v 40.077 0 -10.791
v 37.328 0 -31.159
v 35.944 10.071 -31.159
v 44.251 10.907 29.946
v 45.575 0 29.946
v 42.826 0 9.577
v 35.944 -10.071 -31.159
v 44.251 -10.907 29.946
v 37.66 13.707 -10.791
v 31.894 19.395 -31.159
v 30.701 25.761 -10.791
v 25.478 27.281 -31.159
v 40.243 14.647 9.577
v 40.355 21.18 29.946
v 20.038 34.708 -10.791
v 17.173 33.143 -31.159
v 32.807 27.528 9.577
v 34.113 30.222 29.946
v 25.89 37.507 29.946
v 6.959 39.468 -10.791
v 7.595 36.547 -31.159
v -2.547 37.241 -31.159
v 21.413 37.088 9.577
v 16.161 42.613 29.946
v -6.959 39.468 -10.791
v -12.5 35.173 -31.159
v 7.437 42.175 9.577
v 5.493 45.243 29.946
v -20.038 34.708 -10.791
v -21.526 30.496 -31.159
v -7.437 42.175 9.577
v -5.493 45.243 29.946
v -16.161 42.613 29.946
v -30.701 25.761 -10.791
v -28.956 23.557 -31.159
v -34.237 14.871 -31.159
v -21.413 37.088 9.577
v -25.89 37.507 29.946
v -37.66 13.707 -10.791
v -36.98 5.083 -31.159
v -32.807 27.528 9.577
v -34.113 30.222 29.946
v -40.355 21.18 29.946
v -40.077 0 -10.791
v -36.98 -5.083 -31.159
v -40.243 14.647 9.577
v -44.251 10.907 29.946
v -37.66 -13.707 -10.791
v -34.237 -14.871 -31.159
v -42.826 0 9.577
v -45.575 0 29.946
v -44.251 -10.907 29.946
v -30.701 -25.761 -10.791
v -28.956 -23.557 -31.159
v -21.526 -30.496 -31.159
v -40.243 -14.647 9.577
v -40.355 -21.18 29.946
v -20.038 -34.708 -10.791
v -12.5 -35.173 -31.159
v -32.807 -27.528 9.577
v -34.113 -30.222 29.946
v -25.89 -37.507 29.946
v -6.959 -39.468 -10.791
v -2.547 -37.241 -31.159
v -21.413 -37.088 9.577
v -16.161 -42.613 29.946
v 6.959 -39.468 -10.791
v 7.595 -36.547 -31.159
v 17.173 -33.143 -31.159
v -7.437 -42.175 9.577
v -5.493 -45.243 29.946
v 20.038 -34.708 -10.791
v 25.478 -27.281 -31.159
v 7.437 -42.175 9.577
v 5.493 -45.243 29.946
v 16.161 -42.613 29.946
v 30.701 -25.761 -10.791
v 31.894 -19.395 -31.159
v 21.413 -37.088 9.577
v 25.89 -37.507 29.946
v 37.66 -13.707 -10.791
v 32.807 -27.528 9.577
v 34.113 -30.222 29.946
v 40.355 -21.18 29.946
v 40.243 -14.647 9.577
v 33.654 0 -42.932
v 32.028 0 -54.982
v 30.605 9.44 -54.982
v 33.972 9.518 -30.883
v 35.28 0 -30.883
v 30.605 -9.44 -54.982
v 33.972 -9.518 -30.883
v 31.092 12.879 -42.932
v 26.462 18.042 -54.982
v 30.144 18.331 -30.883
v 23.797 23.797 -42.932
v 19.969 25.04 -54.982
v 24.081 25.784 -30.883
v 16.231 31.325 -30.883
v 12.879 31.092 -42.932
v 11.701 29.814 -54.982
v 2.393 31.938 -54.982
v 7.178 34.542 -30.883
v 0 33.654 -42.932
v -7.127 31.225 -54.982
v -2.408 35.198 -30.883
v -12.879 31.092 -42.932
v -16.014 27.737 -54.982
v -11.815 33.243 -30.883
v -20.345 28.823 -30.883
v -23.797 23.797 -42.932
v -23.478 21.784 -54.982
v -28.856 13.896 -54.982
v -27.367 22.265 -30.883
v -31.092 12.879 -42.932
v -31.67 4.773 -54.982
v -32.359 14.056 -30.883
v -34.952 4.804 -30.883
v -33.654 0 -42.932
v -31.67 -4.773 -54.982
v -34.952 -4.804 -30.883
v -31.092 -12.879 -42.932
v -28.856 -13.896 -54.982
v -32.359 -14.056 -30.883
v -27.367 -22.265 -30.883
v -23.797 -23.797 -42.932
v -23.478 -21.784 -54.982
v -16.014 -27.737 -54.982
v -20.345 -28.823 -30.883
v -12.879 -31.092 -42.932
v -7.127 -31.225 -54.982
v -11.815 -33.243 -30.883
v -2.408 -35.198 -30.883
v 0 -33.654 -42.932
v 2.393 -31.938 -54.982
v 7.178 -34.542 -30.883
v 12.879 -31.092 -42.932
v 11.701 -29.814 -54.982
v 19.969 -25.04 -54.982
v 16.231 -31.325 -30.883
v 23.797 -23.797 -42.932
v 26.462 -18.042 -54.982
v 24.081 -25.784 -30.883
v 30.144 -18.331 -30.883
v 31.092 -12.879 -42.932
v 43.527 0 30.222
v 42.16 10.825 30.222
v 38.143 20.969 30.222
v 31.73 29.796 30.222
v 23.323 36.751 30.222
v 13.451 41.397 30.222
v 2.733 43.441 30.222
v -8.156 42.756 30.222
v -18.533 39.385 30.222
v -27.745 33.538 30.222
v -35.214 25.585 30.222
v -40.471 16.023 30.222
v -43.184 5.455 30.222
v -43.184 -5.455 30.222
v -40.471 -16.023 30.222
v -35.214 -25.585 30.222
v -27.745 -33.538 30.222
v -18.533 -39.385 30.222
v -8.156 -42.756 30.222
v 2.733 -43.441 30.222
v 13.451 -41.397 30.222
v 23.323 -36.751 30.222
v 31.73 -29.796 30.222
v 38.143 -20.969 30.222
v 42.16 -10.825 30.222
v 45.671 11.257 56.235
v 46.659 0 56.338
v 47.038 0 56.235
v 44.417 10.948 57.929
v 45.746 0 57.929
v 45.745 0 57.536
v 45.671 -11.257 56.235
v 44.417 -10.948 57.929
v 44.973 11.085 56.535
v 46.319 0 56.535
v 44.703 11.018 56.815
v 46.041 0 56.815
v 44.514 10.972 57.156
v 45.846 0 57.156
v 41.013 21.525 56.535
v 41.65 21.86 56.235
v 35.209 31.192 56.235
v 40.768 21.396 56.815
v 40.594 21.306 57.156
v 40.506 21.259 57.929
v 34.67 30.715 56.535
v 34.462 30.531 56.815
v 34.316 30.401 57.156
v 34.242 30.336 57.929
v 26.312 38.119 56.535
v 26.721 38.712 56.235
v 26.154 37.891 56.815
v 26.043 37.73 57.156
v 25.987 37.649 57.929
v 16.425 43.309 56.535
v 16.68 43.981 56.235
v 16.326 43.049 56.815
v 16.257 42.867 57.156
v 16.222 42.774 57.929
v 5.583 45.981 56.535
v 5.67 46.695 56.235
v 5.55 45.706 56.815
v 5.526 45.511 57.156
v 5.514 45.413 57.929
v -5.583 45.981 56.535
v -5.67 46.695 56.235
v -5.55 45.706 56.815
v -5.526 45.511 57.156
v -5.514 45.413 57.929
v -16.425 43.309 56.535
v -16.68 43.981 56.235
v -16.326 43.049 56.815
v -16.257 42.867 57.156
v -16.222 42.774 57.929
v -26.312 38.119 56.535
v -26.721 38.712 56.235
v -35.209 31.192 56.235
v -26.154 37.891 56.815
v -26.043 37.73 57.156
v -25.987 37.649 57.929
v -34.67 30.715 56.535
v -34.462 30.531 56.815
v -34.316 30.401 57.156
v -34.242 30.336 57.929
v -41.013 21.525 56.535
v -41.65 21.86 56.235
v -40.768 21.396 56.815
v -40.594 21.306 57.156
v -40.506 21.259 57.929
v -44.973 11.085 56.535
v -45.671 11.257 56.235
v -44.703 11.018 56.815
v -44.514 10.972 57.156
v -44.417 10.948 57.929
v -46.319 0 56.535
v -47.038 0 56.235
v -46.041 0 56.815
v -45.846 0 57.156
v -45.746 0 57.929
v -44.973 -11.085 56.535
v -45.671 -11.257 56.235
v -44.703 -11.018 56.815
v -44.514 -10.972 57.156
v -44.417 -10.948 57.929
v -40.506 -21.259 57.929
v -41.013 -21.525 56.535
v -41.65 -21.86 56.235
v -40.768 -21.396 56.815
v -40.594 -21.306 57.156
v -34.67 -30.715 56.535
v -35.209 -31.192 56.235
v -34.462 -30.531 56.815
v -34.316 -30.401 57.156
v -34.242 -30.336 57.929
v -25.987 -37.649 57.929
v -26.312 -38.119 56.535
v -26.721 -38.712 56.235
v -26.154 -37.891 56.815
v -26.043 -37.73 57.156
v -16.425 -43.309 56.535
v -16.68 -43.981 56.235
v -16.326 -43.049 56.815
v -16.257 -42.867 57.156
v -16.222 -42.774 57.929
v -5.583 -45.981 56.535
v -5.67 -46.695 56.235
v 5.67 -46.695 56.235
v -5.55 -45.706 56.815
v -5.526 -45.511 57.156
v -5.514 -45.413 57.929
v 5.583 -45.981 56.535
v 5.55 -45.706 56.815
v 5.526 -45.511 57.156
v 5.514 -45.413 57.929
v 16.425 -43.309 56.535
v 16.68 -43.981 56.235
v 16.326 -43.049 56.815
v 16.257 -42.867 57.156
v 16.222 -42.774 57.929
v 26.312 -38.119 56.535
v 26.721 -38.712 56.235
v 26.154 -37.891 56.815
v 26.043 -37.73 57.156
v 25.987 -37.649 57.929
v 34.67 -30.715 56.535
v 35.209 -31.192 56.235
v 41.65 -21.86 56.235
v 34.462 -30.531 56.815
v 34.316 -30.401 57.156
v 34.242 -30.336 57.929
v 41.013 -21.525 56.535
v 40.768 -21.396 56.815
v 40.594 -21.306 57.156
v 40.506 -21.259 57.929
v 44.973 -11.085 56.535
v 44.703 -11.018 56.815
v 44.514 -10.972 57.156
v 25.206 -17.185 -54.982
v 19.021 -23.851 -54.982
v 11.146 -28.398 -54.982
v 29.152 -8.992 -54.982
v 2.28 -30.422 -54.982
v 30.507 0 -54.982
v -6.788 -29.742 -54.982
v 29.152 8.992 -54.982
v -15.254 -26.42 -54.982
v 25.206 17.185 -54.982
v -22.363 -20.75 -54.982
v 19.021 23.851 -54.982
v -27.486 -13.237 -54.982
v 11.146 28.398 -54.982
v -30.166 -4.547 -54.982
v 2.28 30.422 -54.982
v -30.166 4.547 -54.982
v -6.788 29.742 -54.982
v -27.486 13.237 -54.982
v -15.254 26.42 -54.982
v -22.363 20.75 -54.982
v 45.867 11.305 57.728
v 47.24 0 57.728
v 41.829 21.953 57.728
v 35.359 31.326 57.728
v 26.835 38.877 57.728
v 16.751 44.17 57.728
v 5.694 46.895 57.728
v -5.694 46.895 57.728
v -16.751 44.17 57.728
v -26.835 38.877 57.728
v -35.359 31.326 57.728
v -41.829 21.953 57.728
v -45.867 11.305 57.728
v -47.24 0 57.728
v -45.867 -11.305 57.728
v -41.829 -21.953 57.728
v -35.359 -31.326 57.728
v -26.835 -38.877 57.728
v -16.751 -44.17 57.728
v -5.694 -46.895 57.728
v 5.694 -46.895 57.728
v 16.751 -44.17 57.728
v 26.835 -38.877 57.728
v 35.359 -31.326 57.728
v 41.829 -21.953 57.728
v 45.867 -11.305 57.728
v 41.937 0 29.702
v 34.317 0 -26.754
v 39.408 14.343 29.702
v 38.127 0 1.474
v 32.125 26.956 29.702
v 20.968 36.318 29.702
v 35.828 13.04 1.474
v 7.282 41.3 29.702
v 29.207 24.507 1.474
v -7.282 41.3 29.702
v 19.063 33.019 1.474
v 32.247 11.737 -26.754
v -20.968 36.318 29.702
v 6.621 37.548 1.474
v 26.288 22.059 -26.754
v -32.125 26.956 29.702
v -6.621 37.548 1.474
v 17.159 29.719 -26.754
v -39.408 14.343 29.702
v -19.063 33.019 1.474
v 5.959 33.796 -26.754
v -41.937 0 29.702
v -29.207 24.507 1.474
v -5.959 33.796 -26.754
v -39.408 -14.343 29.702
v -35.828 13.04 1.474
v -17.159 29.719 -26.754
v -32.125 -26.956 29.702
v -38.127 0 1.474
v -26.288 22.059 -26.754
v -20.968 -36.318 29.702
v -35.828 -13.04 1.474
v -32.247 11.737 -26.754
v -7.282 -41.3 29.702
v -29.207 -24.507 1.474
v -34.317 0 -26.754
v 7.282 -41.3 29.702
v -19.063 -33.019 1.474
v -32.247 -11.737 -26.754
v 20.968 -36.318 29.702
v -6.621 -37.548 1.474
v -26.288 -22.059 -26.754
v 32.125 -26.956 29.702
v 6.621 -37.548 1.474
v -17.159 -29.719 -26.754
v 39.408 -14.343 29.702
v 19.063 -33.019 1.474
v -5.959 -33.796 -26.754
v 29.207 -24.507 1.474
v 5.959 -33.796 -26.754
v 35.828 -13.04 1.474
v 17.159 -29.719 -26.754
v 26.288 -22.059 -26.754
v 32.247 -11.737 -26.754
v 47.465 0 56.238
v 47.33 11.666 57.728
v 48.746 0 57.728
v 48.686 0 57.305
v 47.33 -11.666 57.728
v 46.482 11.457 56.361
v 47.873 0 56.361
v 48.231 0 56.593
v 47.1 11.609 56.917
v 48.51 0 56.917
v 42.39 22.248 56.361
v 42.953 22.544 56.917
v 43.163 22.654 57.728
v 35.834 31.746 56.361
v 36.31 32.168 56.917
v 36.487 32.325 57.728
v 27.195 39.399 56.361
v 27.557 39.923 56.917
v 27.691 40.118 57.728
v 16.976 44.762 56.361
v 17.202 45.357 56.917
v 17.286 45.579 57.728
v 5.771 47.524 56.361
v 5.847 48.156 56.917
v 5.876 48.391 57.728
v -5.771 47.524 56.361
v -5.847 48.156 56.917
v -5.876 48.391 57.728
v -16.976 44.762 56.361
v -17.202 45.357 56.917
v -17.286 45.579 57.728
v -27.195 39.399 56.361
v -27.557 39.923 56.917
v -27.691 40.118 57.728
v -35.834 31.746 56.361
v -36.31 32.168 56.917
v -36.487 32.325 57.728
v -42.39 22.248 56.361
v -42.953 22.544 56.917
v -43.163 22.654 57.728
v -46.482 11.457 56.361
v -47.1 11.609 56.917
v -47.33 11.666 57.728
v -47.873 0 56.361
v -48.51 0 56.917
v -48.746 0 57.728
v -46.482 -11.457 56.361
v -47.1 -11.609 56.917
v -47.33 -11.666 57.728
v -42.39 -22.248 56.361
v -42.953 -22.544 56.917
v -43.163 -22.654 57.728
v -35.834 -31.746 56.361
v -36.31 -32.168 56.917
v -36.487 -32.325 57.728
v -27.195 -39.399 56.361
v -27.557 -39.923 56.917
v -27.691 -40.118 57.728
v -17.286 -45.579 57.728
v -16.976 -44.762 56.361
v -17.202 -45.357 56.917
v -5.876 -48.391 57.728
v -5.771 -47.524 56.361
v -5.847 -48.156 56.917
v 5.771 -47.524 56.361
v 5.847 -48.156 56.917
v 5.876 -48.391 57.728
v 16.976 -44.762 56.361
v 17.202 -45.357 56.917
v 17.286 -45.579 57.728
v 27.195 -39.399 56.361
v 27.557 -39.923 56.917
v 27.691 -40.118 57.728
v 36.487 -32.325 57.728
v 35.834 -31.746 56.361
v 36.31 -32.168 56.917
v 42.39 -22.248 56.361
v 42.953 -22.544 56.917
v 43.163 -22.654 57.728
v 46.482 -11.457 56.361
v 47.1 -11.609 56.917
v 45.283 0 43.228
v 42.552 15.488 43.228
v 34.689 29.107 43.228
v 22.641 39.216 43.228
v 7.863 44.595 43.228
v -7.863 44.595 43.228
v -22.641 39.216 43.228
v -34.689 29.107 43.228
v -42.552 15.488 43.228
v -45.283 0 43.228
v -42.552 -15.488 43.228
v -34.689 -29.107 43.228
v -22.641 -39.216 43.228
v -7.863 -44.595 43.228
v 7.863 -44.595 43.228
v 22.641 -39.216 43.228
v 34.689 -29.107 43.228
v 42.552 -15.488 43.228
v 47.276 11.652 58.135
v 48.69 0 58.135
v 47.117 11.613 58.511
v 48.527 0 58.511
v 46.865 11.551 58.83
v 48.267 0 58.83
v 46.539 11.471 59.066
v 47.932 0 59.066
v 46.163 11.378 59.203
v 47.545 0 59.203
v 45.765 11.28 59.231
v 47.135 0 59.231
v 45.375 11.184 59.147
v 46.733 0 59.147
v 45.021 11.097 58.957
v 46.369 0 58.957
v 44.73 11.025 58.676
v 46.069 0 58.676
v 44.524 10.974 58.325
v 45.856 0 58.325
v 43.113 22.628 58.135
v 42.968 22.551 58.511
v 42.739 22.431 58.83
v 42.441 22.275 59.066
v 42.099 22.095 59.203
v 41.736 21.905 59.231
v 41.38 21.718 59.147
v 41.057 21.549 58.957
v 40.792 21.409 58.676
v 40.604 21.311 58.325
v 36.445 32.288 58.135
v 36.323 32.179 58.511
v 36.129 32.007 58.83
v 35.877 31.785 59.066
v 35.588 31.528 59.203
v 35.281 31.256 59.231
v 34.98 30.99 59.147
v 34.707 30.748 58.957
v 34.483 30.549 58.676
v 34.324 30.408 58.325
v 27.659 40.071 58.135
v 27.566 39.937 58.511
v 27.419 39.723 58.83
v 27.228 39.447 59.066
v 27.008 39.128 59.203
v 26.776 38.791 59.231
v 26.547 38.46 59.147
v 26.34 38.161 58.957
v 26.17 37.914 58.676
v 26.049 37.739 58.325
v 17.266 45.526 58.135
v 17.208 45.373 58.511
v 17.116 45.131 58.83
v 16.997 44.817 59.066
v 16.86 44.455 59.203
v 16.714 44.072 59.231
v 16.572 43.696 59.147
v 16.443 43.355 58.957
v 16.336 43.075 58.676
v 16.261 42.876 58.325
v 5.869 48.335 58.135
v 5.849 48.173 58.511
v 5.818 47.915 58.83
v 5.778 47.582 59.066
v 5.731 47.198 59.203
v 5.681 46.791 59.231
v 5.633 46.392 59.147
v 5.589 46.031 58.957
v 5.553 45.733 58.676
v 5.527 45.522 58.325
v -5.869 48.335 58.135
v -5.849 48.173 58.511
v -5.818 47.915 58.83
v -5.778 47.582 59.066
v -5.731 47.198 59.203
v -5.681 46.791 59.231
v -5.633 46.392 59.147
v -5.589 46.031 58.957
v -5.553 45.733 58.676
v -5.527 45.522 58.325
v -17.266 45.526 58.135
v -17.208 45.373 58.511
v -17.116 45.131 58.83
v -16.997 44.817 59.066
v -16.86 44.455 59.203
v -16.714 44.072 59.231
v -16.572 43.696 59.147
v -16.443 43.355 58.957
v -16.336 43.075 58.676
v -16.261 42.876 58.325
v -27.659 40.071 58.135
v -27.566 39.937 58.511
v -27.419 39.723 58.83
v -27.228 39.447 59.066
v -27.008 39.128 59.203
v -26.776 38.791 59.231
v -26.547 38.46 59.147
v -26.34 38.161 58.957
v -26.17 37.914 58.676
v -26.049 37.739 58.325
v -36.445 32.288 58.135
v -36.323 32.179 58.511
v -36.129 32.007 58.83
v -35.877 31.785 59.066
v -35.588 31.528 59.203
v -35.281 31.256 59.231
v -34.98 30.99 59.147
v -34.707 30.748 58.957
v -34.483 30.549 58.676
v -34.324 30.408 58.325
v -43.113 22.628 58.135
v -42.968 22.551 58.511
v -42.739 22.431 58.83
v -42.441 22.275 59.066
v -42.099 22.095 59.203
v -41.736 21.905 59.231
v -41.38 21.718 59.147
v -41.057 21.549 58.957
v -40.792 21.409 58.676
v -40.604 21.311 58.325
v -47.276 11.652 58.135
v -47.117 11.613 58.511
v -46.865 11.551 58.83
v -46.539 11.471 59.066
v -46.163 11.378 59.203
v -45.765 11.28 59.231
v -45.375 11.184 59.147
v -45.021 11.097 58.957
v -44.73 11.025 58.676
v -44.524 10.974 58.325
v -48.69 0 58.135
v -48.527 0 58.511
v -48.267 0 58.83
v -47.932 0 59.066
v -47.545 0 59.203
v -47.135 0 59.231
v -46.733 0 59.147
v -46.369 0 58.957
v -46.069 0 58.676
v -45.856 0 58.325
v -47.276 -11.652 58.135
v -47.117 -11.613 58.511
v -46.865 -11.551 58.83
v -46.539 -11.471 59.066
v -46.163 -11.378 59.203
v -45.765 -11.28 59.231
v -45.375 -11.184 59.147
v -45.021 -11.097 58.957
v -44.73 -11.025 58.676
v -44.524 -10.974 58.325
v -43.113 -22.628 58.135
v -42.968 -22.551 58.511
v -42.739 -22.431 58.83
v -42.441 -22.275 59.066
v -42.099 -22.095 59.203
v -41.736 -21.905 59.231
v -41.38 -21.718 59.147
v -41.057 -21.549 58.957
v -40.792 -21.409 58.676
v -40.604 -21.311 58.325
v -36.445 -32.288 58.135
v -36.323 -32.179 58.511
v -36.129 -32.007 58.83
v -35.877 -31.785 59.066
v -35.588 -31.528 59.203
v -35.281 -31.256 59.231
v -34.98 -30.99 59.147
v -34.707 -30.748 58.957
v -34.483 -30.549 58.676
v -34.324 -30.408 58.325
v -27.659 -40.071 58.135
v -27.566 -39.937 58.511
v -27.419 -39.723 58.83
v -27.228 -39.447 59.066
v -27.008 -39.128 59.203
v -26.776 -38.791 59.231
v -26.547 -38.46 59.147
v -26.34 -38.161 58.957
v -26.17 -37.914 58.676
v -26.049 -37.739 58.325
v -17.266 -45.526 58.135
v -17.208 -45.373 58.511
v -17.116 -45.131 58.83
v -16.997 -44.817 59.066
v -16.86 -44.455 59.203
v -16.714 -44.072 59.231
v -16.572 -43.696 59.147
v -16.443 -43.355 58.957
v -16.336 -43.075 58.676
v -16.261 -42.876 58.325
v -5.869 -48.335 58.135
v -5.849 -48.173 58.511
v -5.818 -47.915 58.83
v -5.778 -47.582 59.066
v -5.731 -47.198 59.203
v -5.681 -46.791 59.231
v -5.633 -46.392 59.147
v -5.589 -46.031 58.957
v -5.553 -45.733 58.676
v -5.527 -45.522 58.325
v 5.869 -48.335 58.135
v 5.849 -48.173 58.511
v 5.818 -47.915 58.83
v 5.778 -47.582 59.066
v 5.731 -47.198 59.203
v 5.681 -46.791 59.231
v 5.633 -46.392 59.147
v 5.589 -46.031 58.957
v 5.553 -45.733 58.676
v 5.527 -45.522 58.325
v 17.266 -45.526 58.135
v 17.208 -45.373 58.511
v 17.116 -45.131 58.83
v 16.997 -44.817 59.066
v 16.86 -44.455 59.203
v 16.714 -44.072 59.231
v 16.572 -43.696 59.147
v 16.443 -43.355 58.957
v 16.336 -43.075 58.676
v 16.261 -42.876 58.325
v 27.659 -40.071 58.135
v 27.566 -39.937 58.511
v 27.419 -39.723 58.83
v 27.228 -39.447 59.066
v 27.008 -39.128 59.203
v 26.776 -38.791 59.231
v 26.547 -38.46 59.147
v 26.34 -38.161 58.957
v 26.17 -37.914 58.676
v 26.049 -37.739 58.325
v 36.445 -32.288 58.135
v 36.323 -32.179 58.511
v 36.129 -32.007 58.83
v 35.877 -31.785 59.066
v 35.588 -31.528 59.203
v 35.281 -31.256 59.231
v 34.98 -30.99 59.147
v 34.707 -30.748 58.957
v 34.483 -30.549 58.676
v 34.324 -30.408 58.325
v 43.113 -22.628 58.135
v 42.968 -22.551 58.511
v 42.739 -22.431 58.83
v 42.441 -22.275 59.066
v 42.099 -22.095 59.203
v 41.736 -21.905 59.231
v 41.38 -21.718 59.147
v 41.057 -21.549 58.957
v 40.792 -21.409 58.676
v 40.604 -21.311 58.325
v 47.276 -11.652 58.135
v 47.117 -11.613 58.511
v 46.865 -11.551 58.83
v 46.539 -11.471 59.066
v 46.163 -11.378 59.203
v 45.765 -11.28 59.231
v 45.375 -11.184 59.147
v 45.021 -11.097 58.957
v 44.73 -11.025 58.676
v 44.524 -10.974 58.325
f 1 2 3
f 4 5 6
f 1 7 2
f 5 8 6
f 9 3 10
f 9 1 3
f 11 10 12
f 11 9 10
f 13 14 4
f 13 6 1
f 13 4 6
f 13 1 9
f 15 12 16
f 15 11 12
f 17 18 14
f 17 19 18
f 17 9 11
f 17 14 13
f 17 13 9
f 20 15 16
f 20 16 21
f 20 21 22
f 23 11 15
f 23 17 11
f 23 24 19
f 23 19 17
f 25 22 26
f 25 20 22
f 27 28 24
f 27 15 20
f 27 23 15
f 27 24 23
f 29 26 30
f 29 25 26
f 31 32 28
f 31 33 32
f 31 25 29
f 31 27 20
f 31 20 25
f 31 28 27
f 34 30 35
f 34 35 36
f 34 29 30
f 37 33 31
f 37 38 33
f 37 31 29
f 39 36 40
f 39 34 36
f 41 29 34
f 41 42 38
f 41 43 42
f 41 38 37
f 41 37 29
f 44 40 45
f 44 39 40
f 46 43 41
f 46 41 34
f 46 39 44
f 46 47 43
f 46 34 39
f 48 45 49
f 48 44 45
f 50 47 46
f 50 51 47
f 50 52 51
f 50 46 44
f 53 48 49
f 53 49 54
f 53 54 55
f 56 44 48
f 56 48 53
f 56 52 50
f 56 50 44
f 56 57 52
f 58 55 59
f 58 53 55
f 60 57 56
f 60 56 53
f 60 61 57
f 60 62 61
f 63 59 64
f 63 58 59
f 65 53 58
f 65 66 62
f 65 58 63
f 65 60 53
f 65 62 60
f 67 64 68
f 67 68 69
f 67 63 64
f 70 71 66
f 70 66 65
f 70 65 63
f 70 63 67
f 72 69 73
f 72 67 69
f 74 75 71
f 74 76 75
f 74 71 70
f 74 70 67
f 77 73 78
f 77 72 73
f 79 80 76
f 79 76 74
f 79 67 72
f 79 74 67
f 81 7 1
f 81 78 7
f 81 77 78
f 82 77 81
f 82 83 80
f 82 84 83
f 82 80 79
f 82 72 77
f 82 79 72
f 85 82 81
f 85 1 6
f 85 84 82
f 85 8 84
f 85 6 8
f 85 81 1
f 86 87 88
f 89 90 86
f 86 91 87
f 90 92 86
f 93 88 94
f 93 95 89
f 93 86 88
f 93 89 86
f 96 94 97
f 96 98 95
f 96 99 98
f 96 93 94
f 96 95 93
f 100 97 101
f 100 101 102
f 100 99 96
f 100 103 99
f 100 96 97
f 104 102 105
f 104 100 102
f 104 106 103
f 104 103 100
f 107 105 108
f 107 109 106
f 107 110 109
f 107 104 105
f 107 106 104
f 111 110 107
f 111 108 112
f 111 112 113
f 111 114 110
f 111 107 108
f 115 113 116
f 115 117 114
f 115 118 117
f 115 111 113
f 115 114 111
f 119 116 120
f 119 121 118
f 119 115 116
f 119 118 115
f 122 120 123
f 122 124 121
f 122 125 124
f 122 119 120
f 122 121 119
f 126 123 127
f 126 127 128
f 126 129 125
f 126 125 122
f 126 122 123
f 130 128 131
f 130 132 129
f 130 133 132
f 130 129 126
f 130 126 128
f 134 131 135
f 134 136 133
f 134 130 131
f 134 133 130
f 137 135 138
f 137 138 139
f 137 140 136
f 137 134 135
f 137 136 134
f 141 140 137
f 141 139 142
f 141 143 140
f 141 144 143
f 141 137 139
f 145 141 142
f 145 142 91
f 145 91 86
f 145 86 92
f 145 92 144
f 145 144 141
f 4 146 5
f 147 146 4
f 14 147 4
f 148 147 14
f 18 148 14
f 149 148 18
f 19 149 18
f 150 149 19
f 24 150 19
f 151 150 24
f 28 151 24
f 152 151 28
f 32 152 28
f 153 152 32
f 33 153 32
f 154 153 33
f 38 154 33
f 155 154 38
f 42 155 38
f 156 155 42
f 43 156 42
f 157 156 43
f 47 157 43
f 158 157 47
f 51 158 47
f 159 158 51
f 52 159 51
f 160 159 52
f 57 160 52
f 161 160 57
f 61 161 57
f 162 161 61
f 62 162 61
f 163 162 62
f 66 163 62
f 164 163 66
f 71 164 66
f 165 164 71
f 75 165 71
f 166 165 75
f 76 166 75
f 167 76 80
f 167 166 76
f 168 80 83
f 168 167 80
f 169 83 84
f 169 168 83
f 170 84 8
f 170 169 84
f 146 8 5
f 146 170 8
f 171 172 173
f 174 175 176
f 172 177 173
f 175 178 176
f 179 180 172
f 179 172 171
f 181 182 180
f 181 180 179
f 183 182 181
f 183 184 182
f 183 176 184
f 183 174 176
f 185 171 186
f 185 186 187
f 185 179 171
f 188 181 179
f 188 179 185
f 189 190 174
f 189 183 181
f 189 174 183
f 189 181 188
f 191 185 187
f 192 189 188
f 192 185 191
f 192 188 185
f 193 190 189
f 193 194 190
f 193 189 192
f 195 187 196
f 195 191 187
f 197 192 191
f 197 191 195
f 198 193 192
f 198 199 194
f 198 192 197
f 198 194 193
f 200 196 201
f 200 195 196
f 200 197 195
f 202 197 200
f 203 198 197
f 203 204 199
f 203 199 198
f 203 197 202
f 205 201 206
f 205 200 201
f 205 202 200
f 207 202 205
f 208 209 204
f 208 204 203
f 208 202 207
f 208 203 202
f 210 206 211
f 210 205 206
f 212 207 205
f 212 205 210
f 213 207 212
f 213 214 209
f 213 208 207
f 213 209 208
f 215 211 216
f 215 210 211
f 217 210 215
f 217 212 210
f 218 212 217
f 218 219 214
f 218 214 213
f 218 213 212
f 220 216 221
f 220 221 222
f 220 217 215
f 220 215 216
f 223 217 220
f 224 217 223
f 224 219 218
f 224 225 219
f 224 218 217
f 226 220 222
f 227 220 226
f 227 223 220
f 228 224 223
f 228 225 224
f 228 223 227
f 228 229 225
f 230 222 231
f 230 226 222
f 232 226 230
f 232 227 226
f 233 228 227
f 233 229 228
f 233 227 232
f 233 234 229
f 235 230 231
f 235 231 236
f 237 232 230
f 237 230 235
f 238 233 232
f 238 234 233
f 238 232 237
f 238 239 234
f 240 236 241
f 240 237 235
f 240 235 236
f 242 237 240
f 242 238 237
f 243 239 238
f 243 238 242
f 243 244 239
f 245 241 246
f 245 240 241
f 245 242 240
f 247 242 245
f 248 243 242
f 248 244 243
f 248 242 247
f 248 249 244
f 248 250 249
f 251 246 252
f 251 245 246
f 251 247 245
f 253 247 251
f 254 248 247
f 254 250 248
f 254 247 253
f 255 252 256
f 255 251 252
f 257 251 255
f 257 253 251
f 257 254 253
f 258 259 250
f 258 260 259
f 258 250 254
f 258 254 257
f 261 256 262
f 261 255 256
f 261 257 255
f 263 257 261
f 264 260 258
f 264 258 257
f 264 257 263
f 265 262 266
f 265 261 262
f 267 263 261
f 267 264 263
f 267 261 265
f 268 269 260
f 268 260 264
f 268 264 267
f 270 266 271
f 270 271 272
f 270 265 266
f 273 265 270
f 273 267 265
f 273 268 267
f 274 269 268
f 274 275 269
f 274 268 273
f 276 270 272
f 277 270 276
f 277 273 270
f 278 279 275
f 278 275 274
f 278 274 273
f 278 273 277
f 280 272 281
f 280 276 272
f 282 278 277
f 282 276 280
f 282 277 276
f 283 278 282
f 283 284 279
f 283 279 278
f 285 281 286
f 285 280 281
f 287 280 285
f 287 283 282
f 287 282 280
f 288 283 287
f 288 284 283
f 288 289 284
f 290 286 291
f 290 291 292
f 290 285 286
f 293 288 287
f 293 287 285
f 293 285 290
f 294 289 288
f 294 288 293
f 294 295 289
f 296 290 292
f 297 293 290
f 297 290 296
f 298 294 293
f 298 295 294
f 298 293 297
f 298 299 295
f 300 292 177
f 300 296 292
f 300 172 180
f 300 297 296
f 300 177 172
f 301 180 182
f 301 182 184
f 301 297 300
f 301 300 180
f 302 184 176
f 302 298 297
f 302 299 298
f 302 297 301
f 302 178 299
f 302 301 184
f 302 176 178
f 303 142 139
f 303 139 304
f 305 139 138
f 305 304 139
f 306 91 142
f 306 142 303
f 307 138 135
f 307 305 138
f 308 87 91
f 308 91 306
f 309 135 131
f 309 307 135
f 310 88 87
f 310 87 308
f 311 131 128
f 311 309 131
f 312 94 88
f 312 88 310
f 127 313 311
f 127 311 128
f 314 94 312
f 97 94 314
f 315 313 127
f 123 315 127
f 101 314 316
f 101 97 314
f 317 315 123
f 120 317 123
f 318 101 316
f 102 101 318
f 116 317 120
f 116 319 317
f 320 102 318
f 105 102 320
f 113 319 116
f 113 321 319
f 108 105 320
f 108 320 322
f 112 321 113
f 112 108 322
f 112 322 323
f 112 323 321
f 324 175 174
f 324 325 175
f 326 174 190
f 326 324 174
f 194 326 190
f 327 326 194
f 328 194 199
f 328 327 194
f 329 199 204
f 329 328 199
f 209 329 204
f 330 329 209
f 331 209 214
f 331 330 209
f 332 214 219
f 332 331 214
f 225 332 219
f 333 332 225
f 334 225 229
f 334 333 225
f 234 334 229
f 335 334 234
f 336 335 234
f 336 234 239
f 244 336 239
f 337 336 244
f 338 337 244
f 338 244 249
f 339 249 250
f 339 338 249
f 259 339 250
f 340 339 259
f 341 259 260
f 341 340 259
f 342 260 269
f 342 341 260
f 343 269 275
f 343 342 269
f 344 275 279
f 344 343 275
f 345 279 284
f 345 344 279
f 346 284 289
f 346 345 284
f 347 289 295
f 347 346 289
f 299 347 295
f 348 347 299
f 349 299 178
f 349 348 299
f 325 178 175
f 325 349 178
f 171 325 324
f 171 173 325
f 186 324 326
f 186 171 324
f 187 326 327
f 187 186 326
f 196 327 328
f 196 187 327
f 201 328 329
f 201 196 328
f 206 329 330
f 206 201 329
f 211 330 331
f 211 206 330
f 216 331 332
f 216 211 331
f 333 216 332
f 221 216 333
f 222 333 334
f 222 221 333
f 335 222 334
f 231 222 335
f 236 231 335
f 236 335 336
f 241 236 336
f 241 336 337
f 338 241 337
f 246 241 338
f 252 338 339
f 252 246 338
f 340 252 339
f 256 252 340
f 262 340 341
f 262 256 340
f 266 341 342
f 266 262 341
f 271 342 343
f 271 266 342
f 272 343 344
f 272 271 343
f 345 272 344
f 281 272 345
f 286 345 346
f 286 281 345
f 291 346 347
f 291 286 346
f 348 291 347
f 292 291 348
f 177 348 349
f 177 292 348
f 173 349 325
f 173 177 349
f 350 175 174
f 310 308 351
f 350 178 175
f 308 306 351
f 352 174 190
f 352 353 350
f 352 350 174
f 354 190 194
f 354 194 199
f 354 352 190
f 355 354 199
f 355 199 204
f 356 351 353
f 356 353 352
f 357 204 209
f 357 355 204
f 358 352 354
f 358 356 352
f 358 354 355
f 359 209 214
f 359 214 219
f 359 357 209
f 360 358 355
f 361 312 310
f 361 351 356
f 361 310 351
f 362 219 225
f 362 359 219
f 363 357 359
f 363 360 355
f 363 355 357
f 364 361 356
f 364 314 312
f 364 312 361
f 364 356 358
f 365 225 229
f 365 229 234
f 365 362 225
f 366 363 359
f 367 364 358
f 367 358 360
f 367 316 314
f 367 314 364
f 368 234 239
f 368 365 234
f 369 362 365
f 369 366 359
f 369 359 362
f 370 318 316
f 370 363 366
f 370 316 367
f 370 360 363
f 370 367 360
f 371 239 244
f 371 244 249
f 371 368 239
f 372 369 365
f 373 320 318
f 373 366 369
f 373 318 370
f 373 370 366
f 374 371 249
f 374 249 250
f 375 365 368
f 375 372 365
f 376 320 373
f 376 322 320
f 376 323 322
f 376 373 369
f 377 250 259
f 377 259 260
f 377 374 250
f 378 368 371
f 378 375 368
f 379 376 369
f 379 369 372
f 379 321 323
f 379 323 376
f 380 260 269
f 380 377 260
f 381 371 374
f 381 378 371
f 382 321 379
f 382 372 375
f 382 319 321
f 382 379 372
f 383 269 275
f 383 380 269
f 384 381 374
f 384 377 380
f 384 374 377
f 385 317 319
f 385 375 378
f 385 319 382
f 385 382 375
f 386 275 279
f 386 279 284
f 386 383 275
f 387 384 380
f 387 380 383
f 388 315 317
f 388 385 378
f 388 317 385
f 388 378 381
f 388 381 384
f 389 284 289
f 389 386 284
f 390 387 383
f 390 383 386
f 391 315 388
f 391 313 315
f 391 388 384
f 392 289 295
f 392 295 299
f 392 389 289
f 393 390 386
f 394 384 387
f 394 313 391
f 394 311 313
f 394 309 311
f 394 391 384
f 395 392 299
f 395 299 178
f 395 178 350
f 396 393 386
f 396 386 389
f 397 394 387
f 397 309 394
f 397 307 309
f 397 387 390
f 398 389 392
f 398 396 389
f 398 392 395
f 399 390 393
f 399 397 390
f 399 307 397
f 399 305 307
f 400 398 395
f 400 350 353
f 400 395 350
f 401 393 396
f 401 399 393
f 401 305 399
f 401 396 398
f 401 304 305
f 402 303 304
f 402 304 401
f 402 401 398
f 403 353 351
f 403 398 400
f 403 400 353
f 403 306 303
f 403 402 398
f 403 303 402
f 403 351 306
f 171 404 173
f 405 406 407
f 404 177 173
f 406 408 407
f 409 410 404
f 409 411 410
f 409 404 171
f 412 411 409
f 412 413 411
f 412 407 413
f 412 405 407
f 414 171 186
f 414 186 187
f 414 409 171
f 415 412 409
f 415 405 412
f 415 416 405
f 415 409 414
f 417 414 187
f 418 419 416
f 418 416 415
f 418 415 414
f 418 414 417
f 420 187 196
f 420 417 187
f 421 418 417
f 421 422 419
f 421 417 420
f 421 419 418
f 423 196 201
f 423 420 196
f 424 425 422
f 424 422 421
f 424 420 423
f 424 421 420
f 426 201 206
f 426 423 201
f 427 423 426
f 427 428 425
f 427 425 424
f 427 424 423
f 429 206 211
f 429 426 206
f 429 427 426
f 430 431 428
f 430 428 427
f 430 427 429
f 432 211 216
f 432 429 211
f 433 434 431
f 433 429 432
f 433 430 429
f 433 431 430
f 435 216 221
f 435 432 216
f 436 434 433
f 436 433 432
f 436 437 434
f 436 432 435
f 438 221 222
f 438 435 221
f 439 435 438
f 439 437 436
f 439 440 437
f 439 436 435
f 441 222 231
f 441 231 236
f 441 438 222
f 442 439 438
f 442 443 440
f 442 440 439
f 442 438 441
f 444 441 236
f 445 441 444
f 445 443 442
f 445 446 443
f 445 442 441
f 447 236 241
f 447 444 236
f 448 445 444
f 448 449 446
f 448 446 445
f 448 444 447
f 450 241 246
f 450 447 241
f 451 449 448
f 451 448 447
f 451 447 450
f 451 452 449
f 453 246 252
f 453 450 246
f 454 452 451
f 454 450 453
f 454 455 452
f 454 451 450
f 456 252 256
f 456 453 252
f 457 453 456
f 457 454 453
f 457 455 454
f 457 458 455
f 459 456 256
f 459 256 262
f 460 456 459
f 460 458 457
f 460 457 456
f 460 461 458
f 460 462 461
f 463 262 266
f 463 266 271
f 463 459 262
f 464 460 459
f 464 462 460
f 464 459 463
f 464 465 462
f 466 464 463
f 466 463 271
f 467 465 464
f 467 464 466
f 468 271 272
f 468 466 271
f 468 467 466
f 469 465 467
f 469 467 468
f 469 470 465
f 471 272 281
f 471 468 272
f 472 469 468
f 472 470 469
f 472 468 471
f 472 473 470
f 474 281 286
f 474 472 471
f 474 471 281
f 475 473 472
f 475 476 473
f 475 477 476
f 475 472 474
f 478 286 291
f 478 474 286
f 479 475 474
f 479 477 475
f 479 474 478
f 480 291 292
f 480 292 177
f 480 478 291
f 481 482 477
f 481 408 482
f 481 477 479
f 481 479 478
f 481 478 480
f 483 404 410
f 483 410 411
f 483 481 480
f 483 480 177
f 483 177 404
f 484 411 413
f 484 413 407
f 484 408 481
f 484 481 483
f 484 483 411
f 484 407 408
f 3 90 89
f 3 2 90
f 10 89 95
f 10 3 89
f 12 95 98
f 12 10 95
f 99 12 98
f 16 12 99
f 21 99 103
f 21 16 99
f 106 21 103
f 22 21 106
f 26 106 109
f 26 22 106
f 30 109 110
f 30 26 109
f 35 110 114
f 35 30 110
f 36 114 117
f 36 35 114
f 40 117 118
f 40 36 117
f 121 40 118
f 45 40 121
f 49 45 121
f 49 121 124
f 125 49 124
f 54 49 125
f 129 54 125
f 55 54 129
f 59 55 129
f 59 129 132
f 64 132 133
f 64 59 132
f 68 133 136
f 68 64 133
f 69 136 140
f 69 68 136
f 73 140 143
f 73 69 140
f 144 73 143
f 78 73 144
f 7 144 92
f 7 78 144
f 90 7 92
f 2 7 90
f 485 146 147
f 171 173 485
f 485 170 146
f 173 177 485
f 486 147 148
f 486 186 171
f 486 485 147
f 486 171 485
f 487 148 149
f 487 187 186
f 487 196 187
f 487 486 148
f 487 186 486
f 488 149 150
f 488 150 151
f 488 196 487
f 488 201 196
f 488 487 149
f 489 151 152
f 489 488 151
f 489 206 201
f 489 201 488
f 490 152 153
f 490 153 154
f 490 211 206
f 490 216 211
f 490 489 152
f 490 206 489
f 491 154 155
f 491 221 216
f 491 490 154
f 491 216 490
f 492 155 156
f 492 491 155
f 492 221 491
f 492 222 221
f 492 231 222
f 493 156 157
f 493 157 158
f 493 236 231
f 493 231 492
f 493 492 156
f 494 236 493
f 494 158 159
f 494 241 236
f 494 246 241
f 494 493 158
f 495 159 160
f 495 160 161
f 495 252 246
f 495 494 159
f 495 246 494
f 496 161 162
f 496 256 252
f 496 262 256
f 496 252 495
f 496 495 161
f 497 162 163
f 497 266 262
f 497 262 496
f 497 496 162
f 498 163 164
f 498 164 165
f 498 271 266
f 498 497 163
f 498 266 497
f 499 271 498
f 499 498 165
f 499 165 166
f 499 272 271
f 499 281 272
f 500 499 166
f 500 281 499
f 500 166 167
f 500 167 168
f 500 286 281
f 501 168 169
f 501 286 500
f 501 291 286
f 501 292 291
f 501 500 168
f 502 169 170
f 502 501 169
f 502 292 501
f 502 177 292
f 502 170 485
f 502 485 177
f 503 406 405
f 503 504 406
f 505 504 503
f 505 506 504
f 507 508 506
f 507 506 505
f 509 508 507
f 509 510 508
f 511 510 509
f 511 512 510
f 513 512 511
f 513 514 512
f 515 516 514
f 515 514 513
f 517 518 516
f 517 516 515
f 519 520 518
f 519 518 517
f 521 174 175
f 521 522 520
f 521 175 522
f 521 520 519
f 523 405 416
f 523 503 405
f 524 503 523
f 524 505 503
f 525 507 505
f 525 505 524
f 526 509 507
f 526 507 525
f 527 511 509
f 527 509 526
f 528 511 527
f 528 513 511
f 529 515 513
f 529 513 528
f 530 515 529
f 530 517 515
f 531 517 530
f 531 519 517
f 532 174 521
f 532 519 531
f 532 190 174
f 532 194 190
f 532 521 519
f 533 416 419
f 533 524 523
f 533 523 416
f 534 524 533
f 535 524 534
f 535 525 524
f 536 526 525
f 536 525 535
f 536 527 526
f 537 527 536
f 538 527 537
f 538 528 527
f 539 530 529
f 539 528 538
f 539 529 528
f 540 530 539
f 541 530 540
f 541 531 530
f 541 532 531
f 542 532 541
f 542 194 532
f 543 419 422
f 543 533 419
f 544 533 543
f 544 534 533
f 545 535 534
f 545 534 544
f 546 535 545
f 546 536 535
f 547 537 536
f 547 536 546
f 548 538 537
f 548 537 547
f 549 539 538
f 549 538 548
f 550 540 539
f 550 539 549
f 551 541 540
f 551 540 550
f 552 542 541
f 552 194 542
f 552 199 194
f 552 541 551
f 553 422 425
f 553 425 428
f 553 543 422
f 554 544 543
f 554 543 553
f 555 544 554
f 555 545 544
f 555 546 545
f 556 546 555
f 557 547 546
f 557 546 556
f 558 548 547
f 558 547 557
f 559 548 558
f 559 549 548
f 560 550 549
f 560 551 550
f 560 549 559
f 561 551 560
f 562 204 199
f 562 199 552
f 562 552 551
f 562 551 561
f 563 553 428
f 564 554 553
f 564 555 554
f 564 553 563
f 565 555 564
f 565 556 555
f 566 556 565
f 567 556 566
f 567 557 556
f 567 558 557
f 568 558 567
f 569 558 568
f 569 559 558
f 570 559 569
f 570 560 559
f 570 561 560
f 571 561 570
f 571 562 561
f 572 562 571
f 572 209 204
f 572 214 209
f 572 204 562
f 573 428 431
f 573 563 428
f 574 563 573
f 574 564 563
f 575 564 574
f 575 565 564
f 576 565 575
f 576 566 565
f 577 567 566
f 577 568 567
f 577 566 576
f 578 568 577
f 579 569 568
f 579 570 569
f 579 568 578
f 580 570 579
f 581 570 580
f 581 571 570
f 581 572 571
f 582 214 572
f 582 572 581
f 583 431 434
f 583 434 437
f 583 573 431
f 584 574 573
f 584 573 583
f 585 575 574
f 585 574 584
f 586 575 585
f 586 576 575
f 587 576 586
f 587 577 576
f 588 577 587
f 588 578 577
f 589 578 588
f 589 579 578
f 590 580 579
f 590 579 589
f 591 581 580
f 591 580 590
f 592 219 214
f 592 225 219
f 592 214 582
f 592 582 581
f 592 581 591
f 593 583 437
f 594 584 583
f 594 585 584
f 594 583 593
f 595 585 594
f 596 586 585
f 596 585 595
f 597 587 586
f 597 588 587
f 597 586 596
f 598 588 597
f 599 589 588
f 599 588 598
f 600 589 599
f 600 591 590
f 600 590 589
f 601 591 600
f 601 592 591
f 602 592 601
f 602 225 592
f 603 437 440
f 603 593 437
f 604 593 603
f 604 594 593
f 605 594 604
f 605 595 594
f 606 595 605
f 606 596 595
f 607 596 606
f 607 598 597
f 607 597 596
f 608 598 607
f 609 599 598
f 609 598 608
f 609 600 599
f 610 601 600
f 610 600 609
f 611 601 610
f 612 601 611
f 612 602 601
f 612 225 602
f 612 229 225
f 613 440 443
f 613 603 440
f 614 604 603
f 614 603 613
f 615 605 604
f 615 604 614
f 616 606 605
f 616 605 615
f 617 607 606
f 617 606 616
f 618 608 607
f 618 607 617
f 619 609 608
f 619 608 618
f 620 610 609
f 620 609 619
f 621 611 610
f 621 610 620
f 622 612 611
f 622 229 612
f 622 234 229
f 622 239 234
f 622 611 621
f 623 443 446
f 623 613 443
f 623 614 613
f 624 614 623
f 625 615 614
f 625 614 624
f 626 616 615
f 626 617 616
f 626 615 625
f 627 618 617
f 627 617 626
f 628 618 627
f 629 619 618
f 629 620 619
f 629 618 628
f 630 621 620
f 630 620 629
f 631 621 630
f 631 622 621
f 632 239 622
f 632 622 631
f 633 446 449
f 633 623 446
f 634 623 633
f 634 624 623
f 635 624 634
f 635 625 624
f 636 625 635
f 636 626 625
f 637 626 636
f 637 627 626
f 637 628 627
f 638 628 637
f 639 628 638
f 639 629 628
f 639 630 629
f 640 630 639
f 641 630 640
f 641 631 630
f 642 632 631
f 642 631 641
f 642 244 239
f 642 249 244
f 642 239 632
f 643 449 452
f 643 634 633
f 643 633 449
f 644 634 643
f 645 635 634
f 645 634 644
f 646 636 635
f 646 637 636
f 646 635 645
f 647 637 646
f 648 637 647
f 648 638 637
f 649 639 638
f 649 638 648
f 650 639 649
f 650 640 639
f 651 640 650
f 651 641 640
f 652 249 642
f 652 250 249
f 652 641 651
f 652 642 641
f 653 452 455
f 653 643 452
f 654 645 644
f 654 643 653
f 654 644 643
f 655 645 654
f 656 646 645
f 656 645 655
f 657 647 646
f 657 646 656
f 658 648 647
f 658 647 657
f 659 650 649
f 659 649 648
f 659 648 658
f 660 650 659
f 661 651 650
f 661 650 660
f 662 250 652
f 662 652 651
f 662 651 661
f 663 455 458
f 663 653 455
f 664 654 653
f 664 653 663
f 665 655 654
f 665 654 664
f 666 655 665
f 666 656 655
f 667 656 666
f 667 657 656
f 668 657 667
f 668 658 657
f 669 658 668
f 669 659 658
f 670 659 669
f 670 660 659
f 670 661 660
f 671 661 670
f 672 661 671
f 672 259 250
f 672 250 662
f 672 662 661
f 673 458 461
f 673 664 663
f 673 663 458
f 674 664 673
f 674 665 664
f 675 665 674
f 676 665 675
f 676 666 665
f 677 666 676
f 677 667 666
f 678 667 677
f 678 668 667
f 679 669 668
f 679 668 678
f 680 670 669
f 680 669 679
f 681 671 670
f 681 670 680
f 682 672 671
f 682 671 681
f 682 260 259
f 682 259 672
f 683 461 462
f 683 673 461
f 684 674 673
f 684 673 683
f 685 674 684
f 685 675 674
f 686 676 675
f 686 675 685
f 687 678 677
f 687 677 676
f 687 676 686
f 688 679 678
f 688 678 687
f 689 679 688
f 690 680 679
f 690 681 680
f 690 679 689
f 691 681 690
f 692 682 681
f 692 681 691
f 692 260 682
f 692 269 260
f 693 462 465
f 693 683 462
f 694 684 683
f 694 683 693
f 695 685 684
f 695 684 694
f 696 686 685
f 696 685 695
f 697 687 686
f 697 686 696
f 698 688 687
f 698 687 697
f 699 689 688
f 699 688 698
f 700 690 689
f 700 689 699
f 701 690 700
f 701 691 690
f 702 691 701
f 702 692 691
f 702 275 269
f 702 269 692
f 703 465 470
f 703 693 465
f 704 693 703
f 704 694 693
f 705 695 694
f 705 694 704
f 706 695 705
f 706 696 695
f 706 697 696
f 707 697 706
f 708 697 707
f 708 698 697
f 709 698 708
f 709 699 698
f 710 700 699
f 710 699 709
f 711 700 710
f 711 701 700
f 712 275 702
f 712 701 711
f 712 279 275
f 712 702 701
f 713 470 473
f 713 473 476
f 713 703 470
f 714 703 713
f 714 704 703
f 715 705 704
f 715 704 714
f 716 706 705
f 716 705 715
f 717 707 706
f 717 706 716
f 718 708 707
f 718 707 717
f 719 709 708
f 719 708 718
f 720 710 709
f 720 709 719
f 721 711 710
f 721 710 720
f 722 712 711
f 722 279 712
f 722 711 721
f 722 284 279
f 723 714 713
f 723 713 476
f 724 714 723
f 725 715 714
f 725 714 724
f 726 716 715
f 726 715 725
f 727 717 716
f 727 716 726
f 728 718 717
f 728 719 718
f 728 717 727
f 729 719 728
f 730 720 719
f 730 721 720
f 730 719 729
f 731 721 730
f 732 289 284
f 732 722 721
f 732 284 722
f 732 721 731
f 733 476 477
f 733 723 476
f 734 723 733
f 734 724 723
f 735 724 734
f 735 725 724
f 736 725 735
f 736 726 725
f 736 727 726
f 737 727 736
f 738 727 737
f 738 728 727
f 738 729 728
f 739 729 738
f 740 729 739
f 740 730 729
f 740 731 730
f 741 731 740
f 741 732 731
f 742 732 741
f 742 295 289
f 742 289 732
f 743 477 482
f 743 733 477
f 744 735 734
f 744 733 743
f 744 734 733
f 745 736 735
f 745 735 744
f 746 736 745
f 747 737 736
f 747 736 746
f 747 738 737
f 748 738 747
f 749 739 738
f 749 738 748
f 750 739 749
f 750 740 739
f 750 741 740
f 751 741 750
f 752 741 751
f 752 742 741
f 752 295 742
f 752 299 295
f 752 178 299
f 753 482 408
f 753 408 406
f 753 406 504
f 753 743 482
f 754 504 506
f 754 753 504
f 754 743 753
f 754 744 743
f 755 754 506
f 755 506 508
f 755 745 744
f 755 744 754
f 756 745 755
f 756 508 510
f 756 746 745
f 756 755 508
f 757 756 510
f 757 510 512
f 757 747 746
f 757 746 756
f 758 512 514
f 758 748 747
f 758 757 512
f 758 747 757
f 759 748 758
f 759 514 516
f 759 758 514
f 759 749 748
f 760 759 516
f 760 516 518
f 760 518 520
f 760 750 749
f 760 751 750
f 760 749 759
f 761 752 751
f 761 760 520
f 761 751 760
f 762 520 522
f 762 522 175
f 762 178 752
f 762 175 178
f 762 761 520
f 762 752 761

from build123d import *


with BuildPart() as f1:
    # F0 (on Front) → F1 (revolve)
    with BuildSketch(Plane.XZ):
        with BuildLine():
            Line((47.2396692276, 57.7278679256), (47.0381379224, 56.2346753748))
            ThreePointArc((47.0381379224, 56.2346753748), (48.2312803809, 56.5934314217), (48.7464004115, 57.7278679256))
            ThreePointArc((48.7464004115, 57.7278679256), (47.3406620016, 59.2312106411), (45.7464766769, 57.9293992308))
            Line((45.7464766769, 57.9293992308), (47.2396692276, 57.7278679256))
        make_face()
    revolve(axis=Axis((0, 0, 0), (0, 0, 1)))


with BuildPart() as f1b:
    # F0 (on Front) → F1, piece 2 (revolve)
    with BuildSketch(Plane.XZ):
        Polygon((45.5749366056, 29.9456361477), (43.5272923705, 30.2219999798), (35.2801680012, -30.8828723325), (37.3278122364, -31.1592361646), align=None)
        with BuildLine():
            Line((35.2801680012, -30.8828723325), (43.5272923705, 30.2219999798))
            Line((43.5272923705, 30.2219999798), (47.0381379224, 56.2346753748))
            ThreePointArc((47.0381379224, 56.2346753748), (46.0413184968, 56.8145254999), (45.7464766769, 57.9293992308))
            Line((45.7464766769, 57.9293992308), (30.5071964503, -54.9819903256))
            Line((30.5071964503, -54.9819903256), (32.0275890209, -54.9819903256))
            Line((32.0275890209, -54.9819903256), (35.2801680012, -30.8828723325))
        make_face()
    revolve(axis=Axis((0, 0, 0), (0, 0, 1)))


solid = Compound([f1.part, f1b.part])
